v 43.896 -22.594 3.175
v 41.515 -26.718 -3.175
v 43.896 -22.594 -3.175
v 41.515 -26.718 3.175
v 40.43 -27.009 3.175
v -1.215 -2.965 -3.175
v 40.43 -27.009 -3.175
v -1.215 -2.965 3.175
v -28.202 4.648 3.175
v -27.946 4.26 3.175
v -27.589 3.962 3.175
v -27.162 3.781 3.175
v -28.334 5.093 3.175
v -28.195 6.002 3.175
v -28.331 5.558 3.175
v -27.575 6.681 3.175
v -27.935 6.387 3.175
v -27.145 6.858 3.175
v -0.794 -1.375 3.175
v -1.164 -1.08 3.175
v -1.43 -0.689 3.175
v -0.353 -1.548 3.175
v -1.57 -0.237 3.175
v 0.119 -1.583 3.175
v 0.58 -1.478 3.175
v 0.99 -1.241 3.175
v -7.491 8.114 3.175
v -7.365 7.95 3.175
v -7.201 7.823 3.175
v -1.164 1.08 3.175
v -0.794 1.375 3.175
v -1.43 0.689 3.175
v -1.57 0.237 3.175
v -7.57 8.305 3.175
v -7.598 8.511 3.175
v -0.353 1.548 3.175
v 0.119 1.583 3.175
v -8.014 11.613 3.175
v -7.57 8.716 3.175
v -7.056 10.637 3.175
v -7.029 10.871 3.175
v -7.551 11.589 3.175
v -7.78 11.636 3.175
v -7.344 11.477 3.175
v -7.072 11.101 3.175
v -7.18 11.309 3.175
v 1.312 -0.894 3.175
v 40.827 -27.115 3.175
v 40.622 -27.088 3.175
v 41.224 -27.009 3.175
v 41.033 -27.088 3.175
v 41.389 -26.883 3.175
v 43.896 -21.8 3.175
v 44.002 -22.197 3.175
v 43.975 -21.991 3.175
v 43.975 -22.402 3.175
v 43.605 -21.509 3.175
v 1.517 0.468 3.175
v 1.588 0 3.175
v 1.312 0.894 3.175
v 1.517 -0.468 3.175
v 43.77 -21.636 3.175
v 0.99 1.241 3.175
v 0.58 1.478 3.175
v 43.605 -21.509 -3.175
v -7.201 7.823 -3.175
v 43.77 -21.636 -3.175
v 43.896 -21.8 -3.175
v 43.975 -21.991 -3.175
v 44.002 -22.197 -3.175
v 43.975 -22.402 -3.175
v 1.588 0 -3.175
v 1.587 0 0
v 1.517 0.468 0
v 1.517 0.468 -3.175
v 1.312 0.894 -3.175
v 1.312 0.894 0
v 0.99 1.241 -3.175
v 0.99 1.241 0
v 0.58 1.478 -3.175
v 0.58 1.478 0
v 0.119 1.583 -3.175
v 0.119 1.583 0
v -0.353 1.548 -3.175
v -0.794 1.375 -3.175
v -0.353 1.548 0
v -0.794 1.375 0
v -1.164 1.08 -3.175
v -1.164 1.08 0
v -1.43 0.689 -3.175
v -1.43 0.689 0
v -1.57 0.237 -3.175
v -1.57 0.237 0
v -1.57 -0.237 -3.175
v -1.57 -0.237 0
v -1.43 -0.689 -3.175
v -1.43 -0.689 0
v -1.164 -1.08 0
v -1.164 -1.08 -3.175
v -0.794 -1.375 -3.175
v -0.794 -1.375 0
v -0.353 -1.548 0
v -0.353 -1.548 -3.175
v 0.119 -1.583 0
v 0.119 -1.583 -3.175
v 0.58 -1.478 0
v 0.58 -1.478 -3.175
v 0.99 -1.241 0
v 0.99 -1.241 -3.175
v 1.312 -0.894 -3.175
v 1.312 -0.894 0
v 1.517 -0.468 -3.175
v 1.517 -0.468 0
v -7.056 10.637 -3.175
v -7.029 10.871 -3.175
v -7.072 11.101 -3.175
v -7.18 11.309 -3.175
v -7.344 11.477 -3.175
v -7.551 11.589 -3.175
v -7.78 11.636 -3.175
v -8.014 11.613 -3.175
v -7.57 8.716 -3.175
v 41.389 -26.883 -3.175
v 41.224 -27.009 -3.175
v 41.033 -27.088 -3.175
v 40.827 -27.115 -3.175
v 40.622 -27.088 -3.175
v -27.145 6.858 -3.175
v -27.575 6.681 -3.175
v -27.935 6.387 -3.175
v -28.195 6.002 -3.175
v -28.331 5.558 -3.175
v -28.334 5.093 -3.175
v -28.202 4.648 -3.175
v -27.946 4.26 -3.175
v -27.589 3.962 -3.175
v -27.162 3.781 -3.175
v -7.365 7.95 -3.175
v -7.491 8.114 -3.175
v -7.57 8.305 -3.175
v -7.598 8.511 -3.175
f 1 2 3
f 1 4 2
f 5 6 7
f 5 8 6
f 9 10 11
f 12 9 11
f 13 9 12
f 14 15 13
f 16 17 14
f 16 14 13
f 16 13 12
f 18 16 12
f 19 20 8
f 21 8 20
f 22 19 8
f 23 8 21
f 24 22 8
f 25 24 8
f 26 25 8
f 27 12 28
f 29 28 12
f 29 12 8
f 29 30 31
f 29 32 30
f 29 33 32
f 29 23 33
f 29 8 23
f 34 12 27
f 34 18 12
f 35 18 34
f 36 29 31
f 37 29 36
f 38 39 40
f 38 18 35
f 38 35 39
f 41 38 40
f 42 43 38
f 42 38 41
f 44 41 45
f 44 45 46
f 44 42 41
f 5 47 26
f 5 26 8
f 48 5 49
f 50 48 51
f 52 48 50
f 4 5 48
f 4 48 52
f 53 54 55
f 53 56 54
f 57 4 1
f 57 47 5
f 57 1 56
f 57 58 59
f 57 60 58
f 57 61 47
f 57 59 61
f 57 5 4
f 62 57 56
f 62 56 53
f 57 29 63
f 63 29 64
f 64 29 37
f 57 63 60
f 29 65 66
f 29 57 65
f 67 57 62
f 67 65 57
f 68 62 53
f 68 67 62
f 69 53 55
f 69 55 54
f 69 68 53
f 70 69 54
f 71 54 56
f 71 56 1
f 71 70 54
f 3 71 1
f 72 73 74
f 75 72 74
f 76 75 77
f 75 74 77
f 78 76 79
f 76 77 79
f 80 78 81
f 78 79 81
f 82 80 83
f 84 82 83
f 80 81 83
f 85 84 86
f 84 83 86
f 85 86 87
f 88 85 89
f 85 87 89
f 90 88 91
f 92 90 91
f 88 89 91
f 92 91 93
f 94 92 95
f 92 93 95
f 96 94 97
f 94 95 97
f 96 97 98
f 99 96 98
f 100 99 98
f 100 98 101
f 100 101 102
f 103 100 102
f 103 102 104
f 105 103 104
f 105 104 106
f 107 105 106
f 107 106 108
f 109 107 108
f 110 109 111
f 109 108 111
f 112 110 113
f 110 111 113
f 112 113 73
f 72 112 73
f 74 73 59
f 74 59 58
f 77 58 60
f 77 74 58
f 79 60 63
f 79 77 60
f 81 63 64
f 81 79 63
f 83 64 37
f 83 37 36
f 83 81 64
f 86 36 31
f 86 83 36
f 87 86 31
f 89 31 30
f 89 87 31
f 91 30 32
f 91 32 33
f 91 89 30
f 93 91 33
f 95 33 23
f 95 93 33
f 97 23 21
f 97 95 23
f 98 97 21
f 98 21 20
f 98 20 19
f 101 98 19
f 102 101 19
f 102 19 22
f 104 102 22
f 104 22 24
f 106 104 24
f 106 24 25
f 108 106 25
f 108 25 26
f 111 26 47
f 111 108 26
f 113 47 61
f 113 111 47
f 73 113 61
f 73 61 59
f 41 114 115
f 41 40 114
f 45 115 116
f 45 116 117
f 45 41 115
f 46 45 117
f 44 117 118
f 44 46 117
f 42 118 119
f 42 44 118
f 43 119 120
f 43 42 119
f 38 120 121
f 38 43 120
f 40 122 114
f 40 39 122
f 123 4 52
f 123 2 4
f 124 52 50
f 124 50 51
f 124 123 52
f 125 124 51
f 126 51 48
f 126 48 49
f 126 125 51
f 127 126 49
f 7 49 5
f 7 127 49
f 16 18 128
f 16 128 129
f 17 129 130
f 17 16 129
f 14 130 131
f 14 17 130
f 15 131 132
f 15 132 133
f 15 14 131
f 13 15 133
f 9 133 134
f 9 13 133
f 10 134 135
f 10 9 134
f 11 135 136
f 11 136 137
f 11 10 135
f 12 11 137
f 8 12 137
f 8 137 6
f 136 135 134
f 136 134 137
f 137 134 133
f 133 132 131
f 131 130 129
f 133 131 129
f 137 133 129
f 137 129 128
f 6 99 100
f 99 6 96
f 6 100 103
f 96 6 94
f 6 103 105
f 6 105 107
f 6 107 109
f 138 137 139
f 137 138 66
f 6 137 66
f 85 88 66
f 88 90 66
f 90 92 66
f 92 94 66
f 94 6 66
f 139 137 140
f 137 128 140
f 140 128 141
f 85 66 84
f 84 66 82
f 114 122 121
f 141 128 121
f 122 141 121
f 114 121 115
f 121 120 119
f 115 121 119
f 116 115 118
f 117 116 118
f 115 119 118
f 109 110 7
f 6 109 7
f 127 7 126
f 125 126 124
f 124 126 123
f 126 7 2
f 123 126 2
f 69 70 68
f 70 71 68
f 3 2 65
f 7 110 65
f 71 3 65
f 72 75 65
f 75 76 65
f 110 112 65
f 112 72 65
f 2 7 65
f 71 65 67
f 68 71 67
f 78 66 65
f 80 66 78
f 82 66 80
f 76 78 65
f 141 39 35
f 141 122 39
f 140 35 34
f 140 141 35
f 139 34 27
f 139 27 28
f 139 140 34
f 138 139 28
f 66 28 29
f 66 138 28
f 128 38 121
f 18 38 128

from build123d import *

# Parameters (mm, degrees)
BOSS_EXTRUDE1_DEPTH      = 3.175
BOSS_EXTRUDE1_DEPTH_BACK = 3.175
SKETCH1_R                = 1.5875
FILLET1_R                = 0.79375


with BuildPart() as part:
    # Sketch1 → Boss-Extrude1 (new, two sides: drawn at the far end of the back side and taken through both)
    with BuildSketch(Plane.XY.offset(-BOSS_EXTRUDE1_DEPTH_BACK)):
        with BuildLine():
            Line((-7.728108964, 8.128), (-6.707222541, 11.938))
            Line((-6.707222541, 11.938), (-27.145240318, 6.858))
            ThreePointArc((-27.145240318, 6.858), (-28.349785751, 5.325893193), (-27.161747679, 3.780950957))
            Line((-27.161747679, 3.780950957), (-1.215078314, -2.964648418))
            Line((-1.215078314, -2.964648418), (41.117892306, -27.405600401))
            Line((41.117892306, -27.405600401), (44.292892306, -21.906339087))
            Line((44.292892306, -21.906339087), (-7.728108964, 8.128))
        make_face()
        Circle(SKETCH1_R, mode=Mode.SUBTRACT)
    extrude(amount=BOSS_EXTRUDE1_DEPTH + BOSS_EXTRUDE1_DEPTH_BACK)

    # Fillet1
    fillet1_edges = [part.edges().sort_by_distance(p)[0] for p in [
        (44.292892306, -21.906339087, 0),
        (41.117892306, -27.405600401, 0),
        (-7.728108964, 8.128, 0),
        (-6.707222541, 11.938, 0),
    ]]
    fillet(fillet1_edges, radius=FILLET1_R)


solid = part.part
